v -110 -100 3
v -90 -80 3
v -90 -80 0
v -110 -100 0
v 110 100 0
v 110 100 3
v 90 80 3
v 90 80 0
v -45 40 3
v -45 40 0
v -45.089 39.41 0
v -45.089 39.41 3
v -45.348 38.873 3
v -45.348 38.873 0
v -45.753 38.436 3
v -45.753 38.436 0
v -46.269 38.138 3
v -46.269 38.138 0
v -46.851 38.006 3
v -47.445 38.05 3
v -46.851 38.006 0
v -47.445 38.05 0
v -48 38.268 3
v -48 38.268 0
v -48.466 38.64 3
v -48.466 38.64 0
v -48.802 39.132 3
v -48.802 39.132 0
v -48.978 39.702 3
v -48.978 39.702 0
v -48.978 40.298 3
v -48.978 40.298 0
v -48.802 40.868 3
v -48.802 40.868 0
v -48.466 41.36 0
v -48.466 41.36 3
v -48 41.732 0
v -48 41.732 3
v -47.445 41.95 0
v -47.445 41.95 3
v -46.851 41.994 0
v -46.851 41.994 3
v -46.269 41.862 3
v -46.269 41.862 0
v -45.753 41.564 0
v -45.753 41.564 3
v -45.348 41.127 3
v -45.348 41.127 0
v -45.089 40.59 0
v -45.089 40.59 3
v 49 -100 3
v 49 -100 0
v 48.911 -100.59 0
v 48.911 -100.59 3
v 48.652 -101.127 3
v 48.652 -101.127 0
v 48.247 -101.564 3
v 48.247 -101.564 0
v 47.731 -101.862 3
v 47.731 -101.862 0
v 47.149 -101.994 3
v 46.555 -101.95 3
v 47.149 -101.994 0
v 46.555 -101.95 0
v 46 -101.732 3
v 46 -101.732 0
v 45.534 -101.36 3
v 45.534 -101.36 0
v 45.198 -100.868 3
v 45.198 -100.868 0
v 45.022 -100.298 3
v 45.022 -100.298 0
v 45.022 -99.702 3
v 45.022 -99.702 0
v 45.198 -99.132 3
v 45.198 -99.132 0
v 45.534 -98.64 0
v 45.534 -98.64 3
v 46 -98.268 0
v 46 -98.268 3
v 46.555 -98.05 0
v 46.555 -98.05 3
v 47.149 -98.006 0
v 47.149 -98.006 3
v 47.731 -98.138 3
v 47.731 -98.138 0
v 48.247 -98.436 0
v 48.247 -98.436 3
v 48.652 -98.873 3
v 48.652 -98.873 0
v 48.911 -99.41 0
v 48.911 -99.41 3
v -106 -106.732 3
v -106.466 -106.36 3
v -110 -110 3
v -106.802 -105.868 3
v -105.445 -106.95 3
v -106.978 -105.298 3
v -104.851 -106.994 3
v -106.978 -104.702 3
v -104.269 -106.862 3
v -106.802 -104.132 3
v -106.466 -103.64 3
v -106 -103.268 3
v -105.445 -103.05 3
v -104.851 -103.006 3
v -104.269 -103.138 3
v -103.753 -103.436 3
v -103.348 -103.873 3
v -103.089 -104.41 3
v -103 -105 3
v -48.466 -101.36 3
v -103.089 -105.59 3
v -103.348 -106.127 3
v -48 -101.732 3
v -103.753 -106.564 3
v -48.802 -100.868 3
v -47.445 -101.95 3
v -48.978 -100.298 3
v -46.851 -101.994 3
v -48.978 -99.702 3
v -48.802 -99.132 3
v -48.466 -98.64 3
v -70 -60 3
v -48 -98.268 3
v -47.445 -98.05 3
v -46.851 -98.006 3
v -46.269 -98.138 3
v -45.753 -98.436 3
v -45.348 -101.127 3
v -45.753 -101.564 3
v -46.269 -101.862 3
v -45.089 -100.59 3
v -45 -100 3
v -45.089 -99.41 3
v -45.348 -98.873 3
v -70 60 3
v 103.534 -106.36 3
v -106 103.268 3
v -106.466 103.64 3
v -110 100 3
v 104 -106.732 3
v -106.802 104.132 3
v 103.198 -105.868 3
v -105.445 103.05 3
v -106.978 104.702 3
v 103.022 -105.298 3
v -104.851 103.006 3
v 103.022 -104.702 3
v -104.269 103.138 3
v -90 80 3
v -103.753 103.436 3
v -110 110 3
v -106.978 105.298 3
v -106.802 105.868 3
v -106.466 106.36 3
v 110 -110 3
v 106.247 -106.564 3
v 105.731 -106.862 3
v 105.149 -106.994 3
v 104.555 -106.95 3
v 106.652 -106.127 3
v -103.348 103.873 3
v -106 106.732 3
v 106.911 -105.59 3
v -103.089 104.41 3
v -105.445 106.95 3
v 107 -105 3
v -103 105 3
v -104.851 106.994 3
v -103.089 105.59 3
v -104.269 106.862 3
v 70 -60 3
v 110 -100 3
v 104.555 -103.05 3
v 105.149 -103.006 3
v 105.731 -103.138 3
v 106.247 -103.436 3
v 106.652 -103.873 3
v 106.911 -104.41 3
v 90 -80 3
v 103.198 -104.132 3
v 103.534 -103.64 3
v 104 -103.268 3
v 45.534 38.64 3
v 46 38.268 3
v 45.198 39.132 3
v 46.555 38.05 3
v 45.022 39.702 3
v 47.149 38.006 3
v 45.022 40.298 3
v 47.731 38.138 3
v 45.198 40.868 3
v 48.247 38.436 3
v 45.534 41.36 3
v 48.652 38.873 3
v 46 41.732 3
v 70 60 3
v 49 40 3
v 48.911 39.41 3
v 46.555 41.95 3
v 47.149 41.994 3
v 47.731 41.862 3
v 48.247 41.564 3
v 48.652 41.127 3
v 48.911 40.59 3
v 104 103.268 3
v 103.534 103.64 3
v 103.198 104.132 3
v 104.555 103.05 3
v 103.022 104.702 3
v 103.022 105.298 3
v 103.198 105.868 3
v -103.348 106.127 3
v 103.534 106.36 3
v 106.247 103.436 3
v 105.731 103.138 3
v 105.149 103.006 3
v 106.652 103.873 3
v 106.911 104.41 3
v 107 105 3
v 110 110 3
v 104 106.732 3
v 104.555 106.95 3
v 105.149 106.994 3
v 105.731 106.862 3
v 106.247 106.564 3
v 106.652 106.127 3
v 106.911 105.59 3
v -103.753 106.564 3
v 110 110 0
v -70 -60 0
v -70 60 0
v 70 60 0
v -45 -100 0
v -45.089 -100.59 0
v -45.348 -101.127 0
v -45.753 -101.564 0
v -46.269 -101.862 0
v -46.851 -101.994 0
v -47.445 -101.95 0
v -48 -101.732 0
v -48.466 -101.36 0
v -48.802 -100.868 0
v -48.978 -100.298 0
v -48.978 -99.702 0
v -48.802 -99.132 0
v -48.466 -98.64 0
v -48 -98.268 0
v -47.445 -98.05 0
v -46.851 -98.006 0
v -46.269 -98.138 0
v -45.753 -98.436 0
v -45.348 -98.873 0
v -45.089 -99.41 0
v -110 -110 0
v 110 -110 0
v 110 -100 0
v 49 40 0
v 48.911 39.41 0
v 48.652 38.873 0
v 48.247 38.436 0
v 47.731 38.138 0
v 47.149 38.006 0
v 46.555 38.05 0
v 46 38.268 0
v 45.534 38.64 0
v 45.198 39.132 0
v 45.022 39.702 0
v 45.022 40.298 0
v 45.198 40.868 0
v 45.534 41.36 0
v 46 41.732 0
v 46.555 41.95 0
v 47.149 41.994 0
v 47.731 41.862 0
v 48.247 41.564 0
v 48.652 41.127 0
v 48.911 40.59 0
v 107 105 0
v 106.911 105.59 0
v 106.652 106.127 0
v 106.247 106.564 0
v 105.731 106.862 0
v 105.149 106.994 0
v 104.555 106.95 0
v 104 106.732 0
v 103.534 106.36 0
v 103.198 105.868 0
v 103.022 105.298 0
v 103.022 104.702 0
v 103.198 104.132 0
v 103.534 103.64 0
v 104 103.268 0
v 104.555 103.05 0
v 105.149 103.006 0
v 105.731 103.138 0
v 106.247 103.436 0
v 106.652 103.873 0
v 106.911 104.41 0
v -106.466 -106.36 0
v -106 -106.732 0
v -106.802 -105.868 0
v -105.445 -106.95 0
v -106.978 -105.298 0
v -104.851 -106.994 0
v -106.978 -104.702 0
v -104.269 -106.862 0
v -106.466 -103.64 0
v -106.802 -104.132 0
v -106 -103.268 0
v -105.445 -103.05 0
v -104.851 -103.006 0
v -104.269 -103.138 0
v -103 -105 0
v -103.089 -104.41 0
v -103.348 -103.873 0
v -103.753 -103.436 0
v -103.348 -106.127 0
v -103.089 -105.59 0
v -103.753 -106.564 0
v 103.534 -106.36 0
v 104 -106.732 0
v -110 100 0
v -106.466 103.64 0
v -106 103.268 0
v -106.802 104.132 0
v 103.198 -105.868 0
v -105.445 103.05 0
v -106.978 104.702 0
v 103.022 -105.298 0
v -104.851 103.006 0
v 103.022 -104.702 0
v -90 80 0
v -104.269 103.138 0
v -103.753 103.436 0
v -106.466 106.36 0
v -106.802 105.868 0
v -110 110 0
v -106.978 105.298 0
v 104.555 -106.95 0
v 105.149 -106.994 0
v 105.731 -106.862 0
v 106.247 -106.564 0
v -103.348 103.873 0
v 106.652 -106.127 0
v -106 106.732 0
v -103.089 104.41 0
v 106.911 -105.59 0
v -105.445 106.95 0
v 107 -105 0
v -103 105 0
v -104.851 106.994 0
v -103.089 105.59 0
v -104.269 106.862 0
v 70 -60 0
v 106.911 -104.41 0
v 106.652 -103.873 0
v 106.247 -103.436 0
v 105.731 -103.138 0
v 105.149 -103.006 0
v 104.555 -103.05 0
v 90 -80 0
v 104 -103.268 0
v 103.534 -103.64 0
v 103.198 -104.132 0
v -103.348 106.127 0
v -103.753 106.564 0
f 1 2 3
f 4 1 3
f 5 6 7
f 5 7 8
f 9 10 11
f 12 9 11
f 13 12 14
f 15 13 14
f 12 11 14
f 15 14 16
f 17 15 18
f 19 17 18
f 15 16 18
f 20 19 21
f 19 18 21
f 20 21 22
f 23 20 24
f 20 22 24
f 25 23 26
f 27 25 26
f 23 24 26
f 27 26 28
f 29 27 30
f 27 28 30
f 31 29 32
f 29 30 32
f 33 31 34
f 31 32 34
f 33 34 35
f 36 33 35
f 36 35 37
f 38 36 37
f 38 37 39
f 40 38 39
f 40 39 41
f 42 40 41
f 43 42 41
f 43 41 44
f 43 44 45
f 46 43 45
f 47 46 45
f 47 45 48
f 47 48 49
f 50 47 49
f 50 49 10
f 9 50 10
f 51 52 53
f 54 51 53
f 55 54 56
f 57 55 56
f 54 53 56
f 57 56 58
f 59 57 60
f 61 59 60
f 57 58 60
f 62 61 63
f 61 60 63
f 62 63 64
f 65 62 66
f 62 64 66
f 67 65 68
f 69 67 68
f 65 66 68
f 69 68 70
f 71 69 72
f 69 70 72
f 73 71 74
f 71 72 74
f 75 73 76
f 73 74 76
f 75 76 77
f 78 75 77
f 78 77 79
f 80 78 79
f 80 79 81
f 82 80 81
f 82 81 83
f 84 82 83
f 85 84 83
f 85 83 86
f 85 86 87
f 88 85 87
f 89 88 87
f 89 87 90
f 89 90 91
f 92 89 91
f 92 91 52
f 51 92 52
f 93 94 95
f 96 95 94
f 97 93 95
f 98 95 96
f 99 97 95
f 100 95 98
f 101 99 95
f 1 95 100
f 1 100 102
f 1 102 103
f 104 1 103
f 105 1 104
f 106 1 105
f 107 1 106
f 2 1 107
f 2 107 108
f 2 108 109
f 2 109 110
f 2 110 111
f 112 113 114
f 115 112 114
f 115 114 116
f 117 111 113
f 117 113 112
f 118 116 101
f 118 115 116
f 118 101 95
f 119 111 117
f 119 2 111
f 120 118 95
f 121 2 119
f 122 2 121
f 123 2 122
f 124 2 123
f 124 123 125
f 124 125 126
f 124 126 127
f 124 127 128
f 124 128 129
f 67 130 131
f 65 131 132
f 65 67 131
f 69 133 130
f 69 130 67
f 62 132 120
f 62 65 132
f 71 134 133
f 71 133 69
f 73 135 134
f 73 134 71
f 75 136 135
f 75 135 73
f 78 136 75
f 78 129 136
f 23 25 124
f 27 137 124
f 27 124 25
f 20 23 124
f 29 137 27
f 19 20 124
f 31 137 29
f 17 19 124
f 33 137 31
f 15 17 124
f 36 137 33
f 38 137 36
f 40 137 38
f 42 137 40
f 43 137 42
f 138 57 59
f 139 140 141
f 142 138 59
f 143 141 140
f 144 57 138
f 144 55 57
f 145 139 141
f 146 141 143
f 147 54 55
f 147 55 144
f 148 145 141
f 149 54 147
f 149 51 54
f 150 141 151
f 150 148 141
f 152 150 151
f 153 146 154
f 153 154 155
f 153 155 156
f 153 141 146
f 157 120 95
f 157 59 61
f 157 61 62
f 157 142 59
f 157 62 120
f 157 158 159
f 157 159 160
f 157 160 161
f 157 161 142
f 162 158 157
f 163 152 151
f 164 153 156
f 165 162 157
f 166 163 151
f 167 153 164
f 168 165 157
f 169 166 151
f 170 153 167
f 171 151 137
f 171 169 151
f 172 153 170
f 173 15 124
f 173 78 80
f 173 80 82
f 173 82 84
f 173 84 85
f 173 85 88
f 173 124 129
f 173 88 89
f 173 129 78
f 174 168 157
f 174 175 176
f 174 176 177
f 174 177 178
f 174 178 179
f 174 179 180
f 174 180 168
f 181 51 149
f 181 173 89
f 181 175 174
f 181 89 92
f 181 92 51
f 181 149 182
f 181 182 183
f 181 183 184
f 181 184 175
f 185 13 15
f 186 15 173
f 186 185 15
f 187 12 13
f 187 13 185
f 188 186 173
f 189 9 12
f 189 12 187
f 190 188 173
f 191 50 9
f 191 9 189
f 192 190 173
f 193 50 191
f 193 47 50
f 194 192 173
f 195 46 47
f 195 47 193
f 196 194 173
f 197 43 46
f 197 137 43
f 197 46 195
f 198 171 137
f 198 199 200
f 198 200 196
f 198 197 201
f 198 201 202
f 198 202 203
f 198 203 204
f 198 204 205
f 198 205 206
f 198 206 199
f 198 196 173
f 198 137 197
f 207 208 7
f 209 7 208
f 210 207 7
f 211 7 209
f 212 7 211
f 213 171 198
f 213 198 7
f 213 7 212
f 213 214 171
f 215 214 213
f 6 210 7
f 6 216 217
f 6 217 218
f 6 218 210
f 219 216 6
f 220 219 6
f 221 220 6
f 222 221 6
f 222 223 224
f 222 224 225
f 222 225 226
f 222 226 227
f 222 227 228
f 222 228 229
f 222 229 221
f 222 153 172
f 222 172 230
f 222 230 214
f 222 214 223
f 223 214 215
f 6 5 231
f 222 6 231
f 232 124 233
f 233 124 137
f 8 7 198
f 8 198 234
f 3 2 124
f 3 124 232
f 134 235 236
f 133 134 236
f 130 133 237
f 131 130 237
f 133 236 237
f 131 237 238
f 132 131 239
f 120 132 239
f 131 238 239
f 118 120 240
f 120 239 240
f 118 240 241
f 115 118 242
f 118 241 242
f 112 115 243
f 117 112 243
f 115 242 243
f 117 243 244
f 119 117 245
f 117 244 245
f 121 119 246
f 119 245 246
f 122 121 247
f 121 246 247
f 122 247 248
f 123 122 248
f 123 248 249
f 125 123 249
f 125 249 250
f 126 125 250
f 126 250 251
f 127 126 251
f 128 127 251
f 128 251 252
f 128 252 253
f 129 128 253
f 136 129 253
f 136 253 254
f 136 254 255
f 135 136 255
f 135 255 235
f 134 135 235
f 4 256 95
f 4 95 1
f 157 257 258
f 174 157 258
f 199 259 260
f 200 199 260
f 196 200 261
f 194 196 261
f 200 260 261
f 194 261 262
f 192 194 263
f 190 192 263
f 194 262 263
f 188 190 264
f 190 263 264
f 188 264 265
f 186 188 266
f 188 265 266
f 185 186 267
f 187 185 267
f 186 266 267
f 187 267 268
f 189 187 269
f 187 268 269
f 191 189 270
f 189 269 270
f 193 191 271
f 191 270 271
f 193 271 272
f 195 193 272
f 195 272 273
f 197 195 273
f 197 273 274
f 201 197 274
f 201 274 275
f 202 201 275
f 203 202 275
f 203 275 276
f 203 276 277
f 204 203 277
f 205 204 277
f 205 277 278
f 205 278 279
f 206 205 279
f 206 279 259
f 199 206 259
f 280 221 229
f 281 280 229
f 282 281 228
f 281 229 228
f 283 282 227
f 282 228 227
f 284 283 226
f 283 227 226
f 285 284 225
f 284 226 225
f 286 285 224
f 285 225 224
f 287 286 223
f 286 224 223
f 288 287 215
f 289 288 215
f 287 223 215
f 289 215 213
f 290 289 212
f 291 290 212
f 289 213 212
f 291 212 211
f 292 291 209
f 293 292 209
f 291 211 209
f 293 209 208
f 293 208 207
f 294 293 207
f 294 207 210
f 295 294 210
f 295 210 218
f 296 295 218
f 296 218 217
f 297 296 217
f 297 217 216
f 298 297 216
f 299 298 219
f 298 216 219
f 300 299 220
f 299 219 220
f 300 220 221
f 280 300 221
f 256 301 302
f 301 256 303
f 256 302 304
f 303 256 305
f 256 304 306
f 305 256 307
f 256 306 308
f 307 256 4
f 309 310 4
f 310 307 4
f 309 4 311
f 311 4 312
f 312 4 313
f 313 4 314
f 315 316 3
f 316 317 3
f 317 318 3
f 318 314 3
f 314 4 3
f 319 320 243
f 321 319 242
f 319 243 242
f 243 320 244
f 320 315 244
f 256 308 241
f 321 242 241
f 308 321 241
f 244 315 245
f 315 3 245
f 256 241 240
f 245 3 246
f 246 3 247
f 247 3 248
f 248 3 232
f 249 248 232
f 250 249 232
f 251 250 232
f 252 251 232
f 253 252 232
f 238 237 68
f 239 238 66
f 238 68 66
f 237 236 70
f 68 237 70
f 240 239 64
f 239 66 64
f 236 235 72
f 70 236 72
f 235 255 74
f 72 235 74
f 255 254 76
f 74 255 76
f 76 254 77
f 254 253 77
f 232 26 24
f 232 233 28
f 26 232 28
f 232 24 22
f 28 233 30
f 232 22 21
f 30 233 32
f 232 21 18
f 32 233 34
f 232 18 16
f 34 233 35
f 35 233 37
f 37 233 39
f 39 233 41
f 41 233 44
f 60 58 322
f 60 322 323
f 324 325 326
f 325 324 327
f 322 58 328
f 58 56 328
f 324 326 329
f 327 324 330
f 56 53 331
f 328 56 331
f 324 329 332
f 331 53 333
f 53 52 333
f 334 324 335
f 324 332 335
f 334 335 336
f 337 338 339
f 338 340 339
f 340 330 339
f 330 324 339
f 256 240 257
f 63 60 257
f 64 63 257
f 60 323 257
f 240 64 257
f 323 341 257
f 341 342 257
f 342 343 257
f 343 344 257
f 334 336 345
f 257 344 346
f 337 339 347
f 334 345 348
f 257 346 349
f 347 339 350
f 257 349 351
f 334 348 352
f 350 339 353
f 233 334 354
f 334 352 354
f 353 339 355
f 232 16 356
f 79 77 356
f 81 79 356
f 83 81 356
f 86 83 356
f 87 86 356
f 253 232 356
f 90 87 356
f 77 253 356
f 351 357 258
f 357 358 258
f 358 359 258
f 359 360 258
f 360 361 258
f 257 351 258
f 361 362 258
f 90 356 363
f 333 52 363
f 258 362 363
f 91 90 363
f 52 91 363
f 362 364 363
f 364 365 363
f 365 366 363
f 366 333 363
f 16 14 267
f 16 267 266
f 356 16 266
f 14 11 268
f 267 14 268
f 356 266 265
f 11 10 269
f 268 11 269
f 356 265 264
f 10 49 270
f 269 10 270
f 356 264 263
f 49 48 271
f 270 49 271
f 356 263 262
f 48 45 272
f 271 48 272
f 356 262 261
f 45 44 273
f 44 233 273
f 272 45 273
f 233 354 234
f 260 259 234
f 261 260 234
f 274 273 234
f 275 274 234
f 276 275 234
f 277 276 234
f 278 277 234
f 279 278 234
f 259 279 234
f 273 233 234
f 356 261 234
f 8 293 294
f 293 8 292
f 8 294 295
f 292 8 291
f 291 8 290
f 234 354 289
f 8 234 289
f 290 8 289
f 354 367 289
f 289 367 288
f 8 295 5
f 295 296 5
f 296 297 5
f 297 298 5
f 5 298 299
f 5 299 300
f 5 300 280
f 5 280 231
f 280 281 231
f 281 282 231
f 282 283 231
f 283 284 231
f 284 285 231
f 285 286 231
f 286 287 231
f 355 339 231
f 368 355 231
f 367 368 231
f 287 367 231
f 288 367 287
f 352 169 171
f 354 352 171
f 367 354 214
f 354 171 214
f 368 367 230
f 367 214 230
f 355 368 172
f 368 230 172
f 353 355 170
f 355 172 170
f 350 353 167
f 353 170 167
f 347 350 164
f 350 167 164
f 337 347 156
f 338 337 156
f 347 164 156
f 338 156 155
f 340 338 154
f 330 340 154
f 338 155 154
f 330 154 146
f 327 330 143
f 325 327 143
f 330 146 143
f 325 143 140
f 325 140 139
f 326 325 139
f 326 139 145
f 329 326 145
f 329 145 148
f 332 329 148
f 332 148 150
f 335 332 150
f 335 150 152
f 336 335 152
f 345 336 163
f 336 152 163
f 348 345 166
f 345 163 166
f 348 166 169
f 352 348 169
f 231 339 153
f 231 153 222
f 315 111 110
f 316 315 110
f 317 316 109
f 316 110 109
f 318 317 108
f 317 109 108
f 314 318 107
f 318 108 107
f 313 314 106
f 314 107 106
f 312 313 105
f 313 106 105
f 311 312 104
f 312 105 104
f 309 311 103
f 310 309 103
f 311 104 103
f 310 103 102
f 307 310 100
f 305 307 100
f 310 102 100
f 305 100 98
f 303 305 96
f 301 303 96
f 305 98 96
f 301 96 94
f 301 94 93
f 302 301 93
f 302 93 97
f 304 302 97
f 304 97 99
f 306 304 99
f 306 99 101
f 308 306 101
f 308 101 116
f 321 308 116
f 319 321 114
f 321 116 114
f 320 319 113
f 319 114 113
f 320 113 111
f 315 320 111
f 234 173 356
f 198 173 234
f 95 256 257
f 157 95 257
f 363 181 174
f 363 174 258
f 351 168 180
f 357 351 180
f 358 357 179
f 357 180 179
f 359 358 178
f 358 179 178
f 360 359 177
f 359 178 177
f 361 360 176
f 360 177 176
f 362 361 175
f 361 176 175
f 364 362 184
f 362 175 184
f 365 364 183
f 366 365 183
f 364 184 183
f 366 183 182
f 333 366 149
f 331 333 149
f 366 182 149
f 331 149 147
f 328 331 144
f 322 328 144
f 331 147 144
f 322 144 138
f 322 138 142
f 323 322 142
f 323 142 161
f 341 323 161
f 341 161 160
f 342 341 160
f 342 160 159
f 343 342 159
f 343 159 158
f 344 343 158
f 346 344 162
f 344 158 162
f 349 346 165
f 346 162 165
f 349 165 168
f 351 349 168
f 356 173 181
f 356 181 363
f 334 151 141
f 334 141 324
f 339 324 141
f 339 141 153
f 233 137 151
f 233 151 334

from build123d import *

# Parameters (mm, degrees)
F0_W     = 220
F0_H     = 220
F1_DEPTH = 3
F2_W     = 40
F2_H     = 160
F2_R     = 2
F3_DEPTH = 25
F4_SIZE  = 19.99999
F5_R     = 2
F6_DEPTH = 25


# Not quite as in the source:
# - a fillet or chamfer is up to 0.001 mm smaller than in the source, because OpenCascade refuses the exact size
# - a pattern or mirror of a feature is missing from the dataset's text; its kind, count and spacing are read off the source's solid


with BuildPart() as f1:
    # F0 (on Top) → F1 (new body)
    with BuildSketch(Plane.XY):
        Rectangle(F0_W, F0_H)
    extrude(amount=F1_DEPTH)

    # F2 (on face) → F3 (cut)
    with BuildSketch(Plane.XY.offset(3)):
        with Locations((-90, 0)):
            Rectangle(F2_W, F2_H)
        with Locations((105, 105)):
            Circle(F2_R)
        with Locations((105, -105)):
            Circle(F2_R)
        with Locations((-105, 105)):
            Circle(F2_R)
        with Locations((-105, -105)):
            Circle(F2_R)
    f3 = extrude(amount=-F3_DEPTH, mode=Mode.SUBTRACT)

    # F3_copies: F3 across plane
    add(f3.mirror(Plane(origin=(0, 0, 0), x_dir=(0, 0, 1), z_dir=(1, 0, 0))), mode=Mode.SUBTRACT)

    # F4 (size 20 in the source; OpenCascade refuses exactly that, so slightly less here)
    f4_edges = [f1.edges().sort_by_distance(p)[0] for p in [
        (-110, 80, 1.5),
        (-110, -80, 1.5),
        (-70, -80, 1.5),
        (-70, 80, 1.5),
        (110, 80, 1.5),
        (70, 80, 1.5),
        (70, -80, 1.5),
        (110, -80, 1.5),
    ]]
    chamfer(f4_edges, length=F4_SIZE)

    # F5 (on face) → F6 (cut)
    with BuildSketch(Plane(origin=(0, 0, 0), x_dir=(1, 0, 0), z_dir=(0, 0, -1))):
        with Locations((-47, 100)):
            Circle(F5_R)
        with Locations((-47, -40)):
            Circle(F5_R)
        with Locations((47, -40)):
            Circle(F5_R)
        with Locations((47, 100)):
            Circle(F5_R)
    extrude(amount=-F6_DEPTH, mode=Mode.SUBTRACT)


solid = f1.part
